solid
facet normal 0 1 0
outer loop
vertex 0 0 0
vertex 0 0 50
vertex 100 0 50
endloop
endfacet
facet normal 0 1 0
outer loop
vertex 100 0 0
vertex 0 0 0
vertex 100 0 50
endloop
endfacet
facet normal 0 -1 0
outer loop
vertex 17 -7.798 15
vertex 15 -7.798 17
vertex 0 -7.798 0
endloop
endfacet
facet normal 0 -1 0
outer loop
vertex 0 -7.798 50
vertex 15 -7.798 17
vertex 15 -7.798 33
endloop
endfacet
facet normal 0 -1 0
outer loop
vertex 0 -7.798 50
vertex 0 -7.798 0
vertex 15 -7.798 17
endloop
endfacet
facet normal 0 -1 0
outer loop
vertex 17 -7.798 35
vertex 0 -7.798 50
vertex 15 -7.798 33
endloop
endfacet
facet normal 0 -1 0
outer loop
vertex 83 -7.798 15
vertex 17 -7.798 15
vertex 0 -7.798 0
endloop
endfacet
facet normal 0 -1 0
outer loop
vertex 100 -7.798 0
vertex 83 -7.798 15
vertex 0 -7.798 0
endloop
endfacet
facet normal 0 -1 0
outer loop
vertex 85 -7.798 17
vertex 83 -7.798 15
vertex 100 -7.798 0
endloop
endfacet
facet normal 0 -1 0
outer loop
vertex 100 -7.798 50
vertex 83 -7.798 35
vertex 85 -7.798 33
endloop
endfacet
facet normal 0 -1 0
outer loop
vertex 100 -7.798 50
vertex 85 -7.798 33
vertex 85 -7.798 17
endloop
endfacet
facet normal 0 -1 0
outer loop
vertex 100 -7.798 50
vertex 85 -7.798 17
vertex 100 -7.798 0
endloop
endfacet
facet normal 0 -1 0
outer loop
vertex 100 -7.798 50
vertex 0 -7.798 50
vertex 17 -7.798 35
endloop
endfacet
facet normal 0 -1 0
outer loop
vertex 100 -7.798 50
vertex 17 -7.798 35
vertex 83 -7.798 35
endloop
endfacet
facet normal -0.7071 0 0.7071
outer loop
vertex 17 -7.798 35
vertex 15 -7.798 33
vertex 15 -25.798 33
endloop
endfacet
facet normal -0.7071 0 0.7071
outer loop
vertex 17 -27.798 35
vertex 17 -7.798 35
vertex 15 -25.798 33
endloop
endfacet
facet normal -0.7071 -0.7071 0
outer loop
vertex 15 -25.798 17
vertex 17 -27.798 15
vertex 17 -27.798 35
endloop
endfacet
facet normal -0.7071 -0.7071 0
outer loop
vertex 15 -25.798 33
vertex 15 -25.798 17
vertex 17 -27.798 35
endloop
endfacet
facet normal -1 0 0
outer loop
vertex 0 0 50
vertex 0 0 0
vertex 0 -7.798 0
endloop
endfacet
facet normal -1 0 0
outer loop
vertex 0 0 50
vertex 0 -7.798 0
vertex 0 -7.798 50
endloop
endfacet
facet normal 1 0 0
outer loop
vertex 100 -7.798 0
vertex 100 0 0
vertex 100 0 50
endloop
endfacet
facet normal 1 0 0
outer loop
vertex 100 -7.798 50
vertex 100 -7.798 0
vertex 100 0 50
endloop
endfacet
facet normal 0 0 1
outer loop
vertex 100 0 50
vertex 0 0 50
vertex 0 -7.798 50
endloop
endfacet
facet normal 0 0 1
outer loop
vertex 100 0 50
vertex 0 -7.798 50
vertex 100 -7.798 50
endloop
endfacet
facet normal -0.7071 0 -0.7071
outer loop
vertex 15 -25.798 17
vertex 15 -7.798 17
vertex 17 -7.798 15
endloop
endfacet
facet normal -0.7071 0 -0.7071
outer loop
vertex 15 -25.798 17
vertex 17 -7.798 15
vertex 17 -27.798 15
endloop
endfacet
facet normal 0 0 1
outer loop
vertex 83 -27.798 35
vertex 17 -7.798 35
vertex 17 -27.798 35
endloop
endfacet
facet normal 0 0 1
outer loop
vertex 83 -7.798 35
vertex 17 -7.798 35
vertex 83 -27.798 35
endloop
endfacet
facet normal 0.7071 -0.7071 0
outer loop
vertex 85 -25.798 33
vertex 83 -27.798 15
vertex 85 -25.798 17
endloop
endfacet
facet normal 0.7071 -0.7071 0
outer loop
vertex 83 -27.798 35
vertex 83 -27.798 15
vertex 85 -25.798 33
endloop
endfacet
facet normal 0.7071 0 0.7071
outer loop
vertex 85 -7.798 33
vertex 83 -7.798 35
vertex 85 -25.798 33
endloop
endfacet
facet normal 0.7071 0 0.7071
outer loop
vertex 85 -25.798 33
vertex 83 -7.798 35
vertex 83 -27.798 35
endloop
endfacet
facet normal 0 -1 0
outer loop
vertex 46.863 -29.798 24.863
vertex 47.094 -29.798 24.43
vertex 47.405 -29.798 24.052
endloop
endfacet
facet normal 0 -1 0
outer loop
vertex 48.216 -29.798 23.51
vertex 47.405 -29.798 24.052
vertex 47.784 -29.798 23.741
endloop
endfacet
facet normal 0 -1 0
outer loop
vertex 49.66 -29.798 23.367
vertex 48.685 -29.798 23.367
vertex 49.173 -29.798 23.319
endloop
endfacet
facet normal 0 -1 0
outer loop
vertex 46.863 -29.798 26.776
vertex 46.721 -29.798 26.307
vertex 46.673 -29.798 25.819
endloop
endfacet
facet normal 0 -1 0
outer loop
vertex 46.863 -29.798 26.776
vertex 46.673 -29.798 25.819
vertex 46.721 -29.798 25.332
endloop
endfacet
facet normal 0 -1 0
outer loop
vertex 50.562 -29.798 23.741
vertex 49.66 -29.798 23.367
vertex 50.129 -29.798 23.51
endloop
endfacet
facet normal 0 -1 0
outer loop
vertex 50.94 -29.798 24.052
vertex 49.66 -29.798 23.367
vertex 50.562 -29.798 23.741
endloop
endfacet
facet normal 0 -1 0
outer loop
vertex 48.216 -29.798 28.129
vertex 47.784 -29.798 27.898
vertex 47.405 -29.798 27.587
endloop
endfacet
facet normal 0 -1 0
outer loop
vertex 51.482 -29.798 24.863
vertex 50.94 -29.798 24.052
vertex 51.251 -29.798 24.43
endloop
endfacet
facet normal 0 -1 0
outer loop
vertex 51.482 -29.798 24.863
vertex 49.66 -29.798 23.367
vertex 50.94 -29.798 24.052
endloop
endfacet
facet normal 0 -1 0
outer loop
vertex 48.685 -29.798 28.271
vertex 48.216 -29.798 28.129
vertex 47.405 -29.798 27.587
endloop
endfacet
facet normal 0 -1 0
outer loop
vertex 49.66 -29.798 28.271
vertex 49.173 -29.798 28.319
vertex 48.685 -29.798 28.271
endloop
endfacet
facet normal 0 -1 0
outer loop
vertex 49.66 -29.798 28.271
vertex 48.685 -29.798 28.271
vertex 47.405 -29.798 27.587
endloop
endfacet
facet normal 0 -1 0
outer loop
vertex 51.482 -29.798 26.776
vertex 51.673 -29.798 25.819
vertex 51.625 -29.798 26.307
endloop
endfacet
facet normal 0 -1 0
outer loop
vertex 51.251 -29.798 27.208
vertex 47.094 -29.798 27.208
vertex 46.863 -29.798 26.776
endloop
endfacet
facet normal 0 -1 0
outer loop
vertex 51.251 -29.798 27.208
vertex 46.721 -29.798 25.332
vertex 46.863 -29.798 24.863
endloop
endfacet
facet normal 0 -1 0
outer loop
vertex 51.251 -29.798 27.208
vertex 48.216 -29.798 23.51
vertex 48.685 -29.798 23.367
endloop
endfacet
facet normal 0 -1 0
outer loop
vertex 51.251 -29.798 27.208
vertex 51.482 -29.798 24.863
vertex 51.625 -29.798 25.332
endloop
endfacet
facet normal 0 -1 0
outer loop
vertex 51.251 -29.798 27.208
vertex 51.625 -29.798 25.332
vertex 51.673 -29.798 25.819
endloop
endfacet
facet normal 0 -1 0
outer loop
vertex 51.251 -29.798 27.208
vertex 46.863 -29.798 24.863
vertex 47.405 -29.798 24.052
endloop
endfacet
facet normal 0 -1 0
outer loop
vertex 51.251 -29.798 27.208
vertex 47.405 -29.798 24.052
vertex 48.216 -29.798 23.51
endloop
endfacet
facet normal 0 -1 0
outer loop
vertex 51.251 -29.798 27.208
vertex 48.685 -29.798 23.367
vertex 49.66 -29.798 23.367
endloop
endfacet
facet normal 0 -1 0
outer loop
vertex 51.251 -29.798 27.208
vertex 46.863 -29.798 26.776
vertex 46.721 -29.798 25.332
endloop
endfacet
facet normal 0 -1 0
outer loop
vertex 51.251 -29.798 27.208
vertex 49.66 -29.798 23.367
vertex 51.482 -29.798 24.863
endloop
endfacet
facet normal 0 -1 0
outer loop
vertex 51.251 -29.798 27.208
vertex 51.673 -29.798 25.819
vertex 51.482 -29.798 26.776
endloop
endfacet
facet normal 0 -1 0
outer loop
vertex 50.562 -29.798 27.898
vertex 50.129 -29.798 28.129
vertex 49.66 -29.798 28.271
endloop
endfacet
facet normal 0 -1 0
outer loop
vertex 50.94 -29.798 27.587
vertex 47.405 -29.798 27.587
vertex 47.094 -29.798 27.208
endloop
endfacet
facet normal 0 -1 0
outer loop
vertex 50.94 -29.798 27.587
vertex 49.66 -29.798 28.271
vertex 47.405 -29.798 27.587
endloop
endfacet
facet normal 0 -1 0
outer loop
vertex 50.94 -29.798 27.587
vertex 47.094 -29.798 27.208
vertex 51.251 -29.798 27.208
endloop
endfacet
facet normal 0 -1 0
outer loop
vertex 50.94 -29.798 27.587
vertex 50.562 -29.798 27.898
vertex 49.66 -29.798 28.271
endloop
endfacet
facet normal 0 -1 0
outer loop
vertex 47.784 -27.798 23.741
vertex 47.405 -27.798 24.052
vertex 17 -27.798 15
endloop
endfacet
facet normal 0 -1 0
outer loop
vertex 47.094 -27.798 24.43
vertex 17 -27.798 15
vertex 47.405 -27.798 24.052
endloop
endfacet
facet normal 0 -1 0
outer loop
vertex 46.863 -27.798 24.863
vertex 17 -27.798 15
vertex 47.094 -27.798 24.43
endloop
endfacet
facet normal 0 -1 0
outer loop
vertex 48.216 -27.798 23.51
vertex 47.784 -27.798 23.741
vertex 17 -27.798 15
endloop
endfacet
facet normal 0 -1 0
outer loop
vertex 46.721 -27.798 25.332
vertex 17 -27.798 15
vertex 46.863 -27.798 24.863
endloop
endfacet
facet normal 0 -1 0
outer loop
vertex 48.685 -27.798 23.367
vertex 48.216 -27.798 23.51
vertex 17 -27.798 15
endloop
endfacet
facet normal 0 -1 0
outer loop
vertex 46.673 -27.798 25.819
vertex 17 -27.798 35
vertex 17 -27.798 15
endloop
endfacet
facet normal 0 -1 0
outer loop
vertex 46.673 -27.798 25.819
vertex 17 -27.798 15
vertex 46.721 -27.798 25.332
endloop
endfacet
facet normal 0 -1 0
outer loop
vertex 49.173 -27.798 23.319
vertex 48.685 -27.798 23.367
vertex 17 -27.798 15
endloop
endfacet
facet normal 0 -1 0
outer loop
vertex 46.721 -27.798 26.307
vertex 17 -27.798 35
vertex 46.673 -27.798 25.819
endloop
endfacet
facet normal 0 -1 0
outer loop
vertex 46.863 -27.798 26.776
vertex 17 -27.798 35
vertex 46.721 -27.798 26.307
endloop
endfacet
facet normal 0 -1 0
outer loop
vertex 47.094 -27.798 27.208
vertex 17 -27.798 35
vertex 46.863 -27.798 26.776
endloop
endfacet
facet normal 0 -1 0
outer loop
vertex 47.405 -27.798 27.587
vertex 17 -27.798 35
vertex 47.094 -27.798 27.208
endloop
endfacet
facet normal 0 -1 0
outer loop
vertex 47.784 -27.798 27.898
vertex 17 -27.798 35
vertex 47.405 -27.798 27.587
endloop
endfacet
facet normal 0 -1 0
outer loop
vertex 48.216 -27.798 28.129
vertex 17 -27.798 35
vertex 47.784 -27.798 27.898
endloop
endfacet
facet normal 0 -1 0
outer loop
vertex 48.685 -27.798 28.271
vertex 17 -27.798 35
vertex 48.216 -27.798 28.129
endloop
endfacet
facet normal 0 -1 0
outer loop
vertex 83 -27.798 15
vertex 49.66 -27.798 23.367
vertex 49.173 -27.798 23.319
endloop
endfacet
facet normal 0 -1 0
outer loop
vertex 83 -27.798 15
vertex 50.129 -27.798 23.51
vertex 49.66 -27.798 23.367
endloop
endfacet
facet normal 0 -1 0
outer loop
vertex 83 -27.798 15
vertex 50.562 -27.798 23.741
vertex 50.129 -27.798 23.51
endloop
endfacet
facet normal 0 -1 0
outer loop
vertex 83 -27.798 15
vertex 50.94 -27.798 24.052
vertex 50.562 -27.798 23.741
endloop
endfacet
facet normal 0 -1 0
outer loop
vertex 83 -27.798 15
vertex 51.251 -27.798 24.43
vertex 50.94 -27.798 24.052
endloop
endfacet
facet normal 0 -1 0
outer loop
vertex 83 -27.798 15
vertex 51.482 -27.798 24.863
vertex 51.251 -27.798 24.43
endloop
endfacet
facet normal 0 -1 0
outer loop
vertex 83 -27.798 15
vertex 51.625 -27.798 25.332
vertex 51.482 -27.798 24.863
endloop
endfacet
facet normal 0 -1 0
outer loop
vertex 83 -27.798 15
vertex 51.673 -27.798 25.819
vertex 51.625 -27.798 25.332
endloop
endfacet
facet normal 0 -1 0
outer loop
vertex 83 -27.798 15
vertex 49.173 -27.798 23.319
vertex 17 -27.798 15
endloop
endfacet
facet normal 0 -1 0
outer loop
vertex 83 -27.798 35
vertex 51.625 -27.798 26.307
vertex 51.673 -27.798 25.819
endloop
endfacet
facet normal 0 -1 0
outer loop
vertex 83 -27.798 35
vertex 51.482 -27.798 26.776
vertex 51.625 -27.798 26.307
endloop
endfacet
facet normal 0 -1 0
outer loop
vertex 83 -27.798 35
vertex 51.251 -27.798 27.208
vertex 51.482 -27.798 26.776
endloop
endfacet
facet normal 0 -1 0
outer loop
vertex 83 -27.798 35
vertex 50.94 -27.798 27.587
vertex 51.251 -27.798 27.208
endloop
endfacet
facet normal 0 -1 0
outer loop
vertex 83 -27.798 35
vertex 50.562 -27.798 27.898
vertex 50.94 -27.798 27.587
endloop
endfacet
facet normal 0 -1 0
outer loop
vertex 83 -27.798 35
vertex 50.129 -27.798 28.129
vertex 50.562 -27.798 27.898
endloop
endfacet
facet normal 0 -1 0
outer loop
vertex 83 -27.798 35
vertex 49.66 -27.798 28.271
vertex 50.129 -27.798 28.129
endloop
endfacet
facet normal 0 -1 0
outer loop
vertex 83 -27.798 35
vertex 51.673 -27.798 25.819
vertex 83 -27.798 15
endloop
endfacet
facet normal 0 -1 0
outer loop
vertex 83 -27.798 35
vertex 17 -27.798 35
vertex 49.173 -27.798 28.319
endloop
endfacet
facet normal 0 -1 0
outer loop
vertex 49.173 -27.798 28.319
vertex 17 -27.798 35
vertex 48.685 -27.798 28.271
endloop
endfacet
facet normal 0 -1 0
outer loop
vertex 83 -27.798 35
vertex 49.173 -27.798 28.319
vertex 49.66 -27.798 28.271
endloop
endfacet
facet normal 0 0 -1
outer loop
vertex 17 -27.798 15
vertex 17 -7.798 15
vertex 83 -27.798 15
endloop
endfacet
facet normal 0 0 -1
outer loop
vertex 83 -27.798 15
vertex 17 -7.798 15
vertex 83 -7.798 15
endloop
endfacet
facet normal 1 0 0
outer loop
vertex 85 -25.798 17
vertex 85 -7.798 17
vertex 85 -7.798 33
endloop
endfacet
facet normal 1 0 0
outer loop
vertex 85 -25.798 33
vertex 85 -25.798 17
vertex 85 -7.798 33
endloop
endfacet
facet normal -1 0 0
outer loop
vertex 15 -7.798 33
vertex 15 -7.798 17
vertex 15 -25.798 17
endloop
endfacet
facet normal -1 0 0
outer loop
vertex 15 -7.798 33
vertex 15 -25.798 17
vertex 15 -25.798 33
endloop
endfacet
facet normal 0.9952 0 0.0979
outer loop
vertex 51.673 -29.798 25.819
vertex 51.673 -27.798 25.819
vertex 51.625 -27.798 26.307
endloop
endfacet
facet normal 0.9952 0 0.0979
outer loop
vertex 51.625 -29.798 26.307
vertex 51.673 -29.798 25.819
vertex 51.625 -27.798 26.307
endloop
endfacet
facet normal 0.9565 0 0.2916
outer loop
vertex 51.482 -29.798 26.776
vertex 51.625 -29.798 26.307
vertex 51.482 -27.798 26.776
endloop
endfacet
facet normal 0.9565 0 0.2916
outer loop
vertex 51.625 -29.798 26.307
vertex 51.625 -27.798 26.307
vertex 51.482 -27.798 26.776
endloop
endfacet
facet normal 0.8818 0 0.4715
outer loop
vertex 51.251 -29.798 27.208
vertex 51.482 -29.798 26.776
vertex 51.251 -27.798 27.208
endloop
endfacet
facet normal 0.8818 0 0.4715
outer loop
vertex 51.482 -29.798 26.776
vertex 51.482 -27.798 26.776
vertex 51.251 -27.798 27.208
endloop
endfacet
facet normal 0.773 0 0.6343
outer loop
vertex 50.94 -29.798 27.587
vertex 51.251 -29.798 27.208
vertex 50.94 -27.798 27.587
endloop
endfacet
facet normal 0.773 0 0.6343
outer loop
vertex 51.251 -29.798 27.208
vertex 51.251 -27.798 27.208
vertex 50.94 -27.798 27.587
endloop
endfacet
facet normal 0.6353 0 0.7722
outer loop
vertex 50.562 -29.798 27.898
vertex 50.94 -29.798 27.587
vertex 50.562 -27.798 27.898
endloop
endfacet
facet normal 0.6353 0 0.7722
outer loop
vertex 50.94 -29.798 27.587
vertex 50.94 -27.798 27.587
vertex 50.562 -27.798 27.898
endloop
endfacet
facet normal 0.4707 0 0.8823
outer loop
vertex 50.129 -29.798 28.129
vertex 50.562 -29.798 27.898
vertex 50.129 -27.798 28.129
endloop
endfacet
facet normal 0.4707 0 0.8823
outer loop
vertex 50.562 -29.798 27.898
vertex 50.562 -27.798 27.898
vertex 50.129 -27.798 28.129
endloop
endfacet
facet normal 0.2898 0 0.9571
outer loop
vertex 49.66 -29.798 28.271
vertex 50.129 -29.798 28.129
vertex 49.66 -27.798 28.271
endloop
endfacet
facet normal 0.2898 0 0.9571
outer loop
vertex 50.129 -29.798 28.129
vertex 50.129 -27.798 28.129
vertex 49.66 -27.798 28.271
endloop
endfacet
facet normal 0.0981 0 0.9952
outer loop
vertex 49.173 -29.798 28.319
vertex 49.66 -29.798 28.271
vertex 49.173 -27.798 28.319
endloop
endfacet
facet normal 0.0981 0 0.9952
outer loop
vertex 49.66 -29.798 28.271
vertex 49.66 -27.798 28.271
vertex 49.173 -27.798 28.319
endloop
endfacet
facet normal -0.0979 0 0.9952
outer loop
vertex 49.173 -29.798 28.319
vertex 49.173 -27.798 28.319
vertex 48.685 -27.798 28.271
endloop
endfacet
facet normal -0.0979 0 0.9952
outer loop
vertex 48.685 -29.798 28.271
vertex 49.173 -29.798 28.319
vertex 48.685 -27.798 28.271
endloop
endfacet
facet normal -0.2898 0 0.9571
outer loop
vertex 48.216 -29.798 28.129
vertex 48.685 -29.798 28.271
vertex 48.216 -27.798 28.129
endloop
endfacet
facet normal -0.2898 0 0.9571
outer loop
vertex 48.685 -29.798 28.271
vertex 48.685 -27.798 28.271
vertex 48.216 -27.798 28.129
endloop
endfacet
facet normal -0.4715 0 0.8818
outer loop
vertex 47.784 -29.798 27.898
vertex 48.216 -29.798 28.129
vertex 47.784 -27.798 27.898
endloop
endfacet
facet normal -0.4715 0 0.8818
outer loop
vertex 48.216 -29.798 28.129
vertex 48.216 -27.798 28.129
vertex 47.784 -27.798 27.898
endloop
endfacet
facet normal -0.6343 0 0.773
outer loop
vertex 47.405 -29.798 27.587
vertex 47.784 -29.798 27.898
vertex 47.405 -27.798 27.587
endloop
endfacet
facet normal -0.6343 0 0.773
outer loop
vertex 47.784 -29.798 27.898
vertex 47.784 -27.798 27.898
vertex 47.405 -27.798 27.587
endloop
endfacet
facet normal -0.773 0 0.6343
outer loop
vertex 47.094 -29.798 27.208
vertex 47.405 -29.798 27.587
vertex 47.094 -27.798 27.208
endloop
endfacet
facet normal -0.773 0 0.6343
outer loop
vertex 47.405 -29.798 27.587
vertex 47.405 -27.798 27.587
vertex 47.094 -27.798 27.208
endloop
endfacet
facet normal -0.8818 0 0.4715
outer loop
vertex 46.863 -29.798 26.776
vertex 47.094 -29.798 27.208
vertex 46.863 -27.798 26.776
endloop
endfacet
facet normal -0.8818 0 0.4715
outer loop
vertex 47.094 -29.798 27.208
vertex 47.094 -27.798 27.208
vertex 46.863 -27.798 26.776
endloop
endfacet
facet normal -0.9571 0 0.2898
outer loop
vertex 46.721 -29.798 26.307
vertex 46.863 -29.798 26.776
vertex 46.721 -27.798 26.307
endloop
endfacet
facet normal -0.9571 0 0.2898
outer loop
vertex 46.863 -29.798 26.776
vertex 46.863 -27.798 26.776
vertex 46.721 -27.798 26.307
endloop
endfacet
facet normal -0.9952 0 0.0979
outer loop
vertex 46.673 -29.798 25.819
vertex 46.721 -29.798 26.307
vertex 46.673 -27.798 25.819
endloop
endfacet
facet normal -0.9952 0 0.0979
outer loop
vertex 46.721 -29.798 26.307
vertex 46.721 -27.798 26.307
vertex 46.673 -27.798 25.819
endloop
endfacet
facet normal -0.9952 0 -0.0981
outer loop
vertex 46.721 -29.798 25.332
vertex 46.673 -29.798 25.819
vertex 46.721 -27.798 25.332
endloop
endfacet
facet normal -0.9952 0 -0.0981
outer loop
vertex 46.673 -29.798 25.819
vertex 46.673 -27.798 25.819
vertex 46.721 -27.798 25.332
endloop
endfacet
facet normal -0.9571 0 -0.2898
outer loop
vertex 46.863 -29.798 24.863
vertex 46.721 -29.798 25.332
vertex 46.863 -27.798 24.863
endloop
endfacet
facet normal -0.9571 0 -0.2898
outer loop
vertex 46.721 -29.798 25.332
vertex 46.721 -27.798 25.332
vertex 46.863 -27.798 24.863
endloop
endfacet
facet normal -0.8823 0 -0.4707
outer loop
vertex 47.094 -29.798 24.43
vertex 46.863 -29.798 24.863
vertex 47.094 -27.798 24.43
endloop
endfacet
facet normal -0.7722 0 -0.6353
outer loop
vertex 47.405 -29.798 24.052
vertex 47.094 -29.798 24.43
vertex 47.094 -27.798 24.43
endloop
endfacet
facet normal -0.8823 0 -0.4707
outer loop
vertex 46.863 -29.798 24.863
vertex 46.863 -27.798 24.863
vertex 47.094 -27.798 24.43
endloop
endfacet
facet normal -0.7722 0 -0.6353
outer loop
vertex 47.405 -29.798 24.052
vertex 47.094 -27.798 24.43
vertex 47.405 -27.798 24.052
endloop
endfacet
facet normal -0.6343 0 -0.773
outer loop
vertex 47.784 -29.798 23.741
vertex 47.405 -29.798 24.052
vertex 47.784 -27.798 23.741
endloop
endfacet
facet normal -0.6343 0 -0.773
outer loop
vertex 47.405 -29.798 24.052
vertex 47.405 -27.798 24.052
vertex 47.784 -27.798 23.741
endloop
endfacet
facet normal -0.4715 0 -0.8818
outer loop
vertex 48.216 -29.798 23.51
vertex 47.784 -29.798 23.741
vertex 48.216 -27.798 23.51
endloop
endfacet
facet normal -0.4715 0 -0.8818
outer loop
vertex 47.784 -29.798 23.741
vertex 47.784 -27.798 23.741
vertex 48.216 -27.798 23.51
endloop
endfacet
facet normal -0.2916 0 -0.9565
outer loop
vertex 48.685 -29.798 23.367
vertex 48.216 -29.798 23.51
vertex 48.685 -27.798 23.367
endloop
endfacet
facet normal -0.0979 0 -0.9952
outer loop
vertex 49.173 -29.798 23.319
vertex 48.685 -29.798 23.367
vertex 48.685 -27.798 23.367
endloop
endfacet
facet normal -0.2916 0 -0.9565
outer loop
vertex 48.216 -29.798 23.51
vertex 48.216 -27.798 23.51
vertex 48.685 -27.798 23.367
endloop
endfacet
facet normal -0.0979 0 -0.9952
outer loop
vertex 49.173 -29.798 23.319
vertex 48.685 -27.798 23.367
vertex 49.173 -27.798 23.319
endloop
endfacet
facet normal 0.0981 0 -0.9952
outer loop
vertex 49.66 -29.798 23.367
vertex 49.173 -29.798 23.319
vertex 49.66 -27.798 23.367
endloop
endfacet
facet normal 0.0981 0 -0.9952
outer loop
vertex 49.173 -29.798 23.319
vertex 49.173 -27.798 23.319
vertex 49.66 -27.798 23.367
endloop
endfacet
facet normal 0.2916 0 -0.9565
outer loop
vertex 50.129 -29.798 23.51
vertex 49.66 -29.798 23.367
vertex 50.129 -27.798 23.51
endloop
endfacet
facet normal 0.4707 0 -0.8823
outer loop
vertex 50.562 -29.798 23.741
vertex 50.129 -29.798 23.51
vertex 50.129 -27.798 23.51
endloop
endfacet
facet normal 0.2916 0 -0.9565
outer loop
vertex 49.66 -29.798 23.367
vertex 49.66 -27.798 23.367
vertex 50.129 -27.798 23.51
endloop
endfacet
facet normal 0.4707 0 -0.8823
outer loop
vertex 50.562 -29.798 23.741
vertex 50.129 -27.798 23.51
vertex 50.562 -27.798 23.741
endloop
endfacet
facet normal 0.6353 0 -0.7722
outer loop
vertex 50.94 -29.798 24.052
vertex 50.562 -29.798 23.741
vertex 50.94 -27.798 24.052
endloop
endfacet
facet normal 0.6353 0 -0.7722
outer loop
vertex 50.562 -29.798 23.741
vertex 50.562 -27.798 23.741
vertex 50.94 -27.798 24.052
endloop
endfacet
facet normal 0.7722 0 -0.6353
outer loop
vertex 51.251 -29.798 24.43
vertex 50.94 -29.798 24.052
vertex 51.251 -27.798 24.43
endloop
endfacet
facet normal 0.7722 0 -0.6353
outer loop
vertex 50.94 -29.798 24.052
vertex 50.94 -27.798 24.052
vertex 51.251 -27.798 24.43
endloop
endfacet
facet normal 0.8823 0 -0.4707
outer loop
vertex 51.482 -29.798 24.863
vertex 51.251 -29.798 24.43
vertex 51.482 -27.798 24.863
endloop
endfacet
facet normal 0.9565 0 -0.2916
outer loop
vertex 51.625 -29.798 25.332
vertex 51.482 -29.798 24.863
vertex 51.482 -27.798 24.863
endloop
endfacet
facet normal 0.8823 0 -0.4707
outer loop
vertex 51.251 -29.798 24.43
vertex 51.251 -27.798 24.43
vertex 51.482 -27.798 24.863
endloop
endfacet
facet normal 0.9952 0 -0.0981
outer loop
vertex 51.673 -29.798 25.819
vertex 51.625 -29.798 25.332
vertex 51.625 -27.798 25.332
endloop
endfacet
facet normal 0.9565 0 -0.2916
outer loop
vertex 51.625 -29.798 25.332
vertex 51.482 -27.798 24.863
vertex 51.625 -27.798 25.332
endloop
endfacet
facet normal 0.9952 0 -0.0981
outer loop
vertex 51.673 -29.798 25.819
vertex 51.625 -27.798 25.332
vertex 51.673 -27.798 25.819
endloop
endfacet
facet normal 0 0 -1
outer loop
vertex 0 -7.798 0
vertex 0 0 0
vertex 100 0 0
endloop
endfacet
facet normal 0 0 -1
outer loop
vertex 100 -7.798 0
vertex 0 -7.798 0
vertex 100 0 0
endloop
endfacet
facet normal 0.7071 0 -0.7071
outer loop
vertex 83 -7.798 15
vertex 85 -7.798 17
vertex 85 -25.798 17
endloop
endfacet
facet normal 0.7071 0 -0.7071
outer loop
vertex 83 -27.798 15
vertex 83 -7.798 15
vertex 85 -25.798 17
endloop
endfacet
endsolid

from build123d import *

# Parameters (mm, degrees)
F0_W     = 100
F0_H     = 50
F1_DEPTH = 7.798489
F2_W     = 70
F2_H     = 20
F3_DEPTH = 20
F5_SIZE  = 2
F6_R     = 2.5
F7_DEPTH = 2


with BuildPart() as f1:
    # F0 (on Front) → F1 (new body)
    with BuildSketch(Plane.XZ):
        with Locations((50, 25)):
            Rectangle(F0_W, F0_H)
    extrude(amount=F1_DEPTH)

    # F2 (on face) → F3 (join)
    with BuildSketch(Plane.XZ.offset(7.798489)):
        with Locations((50, 25)):
            Rectangle(F2_W, F2_H)
    extrude(amount=F3_DEPTH)

    # F5
    f5_edges = [f1.edges().sort_by_distance(p)[0] for p in [
        (85, -17.798489, 15),
        (85, -17.798489, 35),
        (15, -17.798489, 15),
        (15, -17.798489, 35),
        (15, -27.798489, 25),
        (85, -27.798489, 25),
    ]]
    chamfer(f5_edges, length=F5_SIZE)

    # F6 (on face) → F7 (join)
    with BuildSketch(Plane.XZ.offset(27.798489)):
        with Locations((49.172595, 25.819309)):
            Circle(F6_R)
    extrude(amount=F7_DEPTH)


solid = f1.part
